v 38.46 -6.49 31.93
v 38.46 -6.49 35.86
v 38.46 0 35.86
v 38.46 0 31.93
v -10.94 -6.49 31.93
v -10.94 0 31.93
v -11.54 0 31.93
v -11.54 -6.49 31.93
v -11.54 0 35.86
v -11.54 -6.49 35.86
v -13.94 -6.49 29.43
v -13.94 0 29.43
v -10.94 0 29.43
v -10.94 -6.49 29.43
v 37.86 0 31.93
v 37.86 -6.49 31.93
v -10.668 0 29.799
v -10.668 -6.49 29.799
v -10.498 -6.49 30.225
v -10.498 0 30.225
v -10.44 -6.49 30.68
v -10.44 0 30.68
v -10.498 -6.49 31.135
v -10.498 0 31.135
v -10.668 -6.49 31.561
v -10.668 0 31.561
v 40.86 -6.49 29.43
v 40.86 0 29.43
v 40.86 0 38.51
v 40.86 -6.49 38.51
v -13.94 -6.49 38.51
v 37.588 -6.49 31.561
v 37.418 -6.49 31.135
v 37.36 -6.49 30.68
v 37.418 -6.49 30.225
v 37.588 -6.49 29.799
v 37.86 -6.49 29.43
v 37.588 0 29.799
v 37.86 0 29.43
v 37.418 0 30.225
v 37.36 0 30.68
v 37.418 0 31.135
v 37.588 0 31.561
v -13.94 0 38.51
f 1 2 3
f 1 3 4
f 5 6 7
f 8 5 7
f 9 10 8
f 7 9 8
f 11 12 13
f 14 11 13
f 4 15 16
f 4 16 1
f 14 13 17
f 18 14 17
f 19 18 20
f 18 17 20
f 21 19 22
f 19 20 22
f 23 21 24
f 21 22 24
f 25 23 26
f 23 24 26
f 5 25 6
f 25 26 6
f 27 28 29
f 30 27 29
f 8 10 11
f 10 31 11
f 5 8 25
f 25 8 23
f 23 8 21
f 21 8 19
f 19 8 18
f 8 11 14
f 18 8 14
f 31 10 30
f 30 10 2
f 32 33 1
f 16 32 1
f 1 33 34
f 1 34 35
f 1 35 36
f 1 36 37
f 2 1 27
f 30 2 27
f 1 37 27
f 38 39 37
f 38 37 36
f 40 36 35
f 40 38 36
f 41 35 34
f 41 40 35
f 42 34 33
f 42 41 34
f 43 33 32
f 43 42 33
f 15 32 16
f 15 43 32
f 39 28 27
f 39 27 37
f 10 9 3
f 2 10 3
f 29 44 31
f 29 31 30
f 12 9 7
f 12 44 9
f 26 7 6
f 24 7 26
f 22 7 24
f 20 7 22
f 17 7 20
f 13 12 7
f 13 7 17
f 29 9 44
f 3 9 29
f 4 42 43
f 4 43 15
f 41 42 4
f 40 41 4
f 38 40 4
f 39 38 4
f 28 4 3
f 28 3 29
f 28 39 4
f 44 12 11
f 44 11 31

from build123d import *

# Parameters (mm, degrees)
SKETCH2_W           = 54.8
SKETCH2_H           = 9.08
BOSS_EXTRUDE1_DEPTH = 6.49
SKETCH3_W           = 50
SKETCH3_H           = 6.43
CUT_EXTRUDE1_DEPTH  = 57.521498565
BOSS_EXTRUDE2_DEPTH = 6.49


with BuildPart() as part:
    # Sketch2 → Boss-Extrude1 (new body)
    with BuildSketch(Plane.XZ):
        with Locations((13.46, 33.97)):
            Rectangle(SKETCH2_W, SKETCH2_H)
    extrude(amount=BOSS_EXTRUDE1_DEPTH)

    # Sketch3 → Cut-Extrude1 (cut, through all)
    with BuildSketch(Plane(origin=(0, 0, 0), x_dir=(1, 0, 0), z_dir=(0, 1, 0))):
        with Locations((13.46, -32.645)):
            Rectangle(SKETCH3_W, SKETCH3_H)
    extrude(amount=-CUT_EXTRUDE1_DEPTH, mode=Mode.SUBTRACT)

    # Sketch4 → Boss-Extrude2 (add, through all)
    with BuildSketch(Plane(origin=(0, 0, 0), x_dir=(1, 0, 0), z_dir=(0, 1, 0))):
        with BuildLine():
            Line((38.46, -29.43), (37.86, -29.43))
            ThreePointArc((37.86, -29.43), (37.36, -30.68), (37.86, -31.93))
            Line((37.86, -31.93), (38.46, -31.93))
            Line((38.46, -31.93), (38.46, -29.43))
        make_face()
        with BuildLine():
            Line((-10.94, -31.93), (-11.54, -31.93))
            Line((-11.54, -31.93), (-11.54, -29.43))
            Line((-11.54, -29.43), (-10.94, -29.43))
            ThreePointArc((-10.94, -29.43), (-10.44, -30.68), (-10.94, -31.93))
        make_face()
    extrude(amount=-BOSS_EXTRUDE2_DEPTH)


solid = part.part
